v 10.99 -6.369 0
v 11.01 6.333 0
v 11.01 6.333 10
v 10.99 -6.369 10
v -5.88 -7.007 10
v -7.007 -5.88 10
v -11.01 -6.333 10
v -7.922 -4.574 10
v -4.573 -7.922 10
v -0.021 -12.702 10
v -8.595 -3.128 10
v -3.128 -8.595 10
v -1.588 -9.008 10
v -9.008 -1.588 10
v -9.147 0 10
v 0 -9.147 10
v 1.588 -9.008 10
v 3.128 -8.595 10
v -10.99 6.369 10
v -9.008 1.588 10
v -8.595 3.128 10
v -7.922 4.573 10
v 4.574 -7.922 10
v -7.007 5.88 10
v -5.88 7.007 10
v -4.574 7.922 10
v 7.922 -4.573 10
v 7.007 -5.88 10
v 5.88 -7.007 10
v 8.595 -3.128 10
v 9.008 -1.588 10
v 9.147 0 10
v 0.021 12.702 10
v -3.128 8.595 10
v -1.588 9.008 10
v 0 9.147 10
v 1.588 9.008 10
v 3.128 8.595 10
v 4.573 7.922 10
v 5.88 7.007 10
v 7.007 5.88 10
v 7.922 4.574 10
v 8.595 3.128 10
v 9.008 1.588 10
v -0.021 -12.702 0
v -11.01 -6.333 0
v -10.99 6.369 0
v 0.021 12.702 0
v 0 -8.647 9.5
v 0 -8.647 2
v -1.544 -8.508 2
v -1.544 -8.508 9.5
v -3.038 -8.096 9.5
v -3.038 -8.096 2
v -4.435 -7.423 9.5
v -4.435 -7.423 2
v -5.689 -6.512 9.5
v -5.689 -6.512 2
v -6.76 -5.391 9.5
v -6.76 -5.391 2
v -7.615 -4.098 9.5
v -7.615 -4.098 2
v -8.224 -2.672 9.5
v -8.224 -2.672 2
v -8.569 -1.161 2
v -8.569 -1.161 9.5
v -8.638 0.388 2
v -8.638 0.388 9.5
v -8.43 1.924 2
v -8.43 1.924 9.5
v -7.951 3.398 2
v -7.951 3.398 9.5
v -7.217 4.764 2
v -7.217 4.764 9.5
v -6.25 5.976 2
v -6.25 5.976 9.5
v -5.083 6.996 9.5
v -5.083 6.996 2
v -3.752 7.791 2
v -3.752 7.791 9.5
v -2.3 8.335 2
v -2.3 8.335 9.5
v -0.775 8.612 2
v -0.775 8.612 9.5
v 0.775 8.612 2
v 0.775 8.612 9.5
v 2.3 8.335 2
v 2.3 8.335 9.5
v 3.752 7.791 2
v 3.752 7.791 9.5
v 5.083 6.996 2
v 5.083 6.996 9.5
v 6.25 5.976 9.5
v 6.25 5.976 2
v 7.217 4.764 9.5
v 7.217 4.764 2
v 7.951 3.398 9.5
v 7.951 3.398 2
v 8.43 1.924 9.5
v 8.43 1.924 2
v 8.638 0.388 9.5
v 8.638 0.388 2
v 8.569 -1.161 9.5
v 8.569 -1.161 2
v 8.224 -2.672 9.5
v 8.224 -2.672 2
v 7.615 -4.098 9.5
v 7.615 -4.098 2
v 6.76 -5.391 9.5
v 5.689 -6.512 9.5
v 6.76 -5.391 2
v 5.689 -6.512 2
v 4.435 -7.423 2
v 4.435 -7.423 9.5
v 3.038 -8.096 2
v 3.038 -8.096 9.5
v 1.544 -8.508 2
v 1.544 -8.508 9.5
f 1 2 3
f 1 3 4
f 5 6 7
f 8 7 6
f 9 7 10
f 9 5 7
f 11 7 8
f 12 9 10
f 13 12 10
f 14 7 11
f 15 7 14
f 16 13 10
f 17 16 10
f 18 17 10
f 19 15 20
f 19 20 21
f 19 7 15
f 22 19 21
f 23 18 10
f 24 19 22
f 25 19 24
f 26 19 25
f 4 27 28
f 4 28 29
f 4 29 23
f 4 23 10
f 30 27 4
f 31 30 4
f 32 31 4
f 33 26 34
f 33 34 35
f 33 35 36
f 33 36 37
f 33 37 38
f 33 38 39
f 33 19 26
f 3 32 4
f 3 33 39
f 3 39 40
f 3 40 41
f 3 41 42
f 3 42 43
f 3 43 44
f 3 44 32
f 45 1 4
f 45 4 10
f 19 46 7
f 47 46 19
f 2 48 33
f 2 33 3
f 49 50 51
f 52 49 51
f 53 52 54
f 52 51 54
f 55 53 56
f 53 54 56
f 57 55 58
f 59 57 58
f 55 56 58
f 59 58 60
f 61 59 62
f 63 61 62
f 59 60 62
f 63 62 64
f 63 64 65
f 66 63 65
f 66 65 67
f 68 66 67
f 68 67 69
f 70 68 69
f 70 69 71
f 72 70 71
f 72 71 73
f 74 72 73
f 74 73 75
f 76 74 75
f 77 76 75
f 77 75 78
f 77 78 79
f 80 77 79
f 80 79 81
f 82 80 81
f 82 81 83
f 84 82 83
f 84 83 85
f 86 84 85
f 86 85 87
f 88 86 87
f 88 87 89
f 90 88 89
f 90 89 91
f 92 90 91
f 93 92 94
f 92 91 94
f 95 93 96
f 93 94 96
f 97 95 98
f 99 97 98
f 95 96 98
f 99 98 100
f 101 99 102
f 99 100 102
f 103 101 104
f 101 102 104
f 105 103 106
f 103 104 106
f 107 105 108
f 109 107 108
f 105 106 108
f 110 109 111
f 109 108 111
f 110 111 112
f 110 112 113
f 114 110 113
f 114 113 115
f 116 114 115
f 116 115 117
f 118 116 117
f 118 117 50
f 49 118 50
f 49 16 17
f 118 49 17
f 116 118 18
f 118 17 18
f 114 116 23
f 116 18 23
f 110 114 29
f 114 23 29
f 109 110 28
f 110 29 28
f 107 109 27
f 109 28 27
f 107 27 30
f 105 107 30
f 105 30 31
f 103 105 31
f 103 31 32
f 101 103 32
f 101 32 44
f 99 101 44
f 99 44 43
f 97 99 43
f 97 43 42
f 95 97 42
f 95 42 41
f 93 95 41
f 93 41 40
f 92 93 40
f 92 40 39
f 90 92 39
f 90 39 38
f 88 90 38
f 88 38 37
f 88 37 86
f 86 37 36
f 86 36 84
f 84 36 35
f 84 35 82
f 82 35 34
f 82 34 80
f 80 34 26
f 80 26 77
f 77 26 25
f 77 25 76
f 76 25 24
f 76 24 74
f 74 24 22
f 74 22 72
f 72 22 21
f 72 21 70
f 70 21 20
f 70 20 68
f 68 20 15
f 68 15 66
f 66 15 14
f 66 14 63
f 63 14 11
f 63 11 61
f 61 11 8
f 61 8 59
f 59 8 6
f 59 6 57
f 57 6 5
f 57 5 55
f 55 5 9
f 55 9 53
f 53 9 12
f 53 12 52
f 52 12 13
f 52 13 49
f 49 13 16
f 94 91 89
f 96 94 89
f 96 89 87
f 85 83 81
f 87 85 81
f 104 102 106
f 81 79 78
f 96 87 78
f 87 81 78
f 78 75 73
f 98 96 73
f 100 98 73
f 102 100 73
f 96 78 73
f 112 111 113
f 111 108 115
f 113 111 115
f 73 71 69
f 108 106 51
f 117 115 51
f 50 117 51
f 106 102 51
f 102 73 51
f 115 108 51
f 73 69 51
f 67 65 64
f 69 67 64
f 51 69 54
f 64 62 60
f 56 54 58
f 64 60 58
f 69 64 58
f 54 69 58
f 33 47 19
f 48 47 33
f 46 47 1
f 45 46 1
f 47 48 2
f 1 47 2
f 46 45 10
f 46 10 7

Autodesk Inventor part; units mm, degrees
ref_plane "YZ Plane" through (0, 0, 0) normal (1, 0, 0) x (0, 1, 0)
ref_plane "XZ Plane" through (0, 0, 0) normal (0, 1, 0) x (-1, 0, 0)
ref_plane "XY Plane" through (0, 0, 0) normal (0, 0, 1) x (1, 0, 0)
sketch "Skizze1" plane through (0, 0, 0) normal (0, 0, 1) x (1, 0, 0)
  line L0 (-15.4146, 0) -> (15.4146, 0) projected
  line L1 (0, -17.7824) -> (0, 17.7824) projected
  line L2 (-10.9895, 6.3689) -> (0.0209, 12.7017)
  line L3 (0.0209, 12.7017) -> (11.0104, 6.3328)
  line L4 (11.0104, 6.3328) -> (10.9895, -6.3689)
  line L5 (10.9895, -6.3689) -> (-0.0209, -12.7017)
  line L6 (-0.0209, -12.7017) -> (-11.0104, -6.3328)
  line L7 (-11.0104, -6.3328) -> (-10.9895, 6.3689)
  circle A0 centre (0, 0) radius 10
  dimension "d0" = 20
  dimension "d1" = 11
extrude "Extrusion1" add sketch "Skizze1" along normal blind 10
sketch "Skizze2" plane through (0, 0, 10) normal (0, 0, 1) x (1, 0, 0)
  point P0 (0, 0)
hole "Bohrung1" at (0, 0, 10) direction (0, 0, -1) diameter 17.294 depth 8 thread size "M20x2.5" class "6H" standard "ISO Metric profile"
chamfer "Fase1" distance 0.5 angle 45 1 edges at (0, 8.647, 10)
properties part number "Wasserverteiler2"
